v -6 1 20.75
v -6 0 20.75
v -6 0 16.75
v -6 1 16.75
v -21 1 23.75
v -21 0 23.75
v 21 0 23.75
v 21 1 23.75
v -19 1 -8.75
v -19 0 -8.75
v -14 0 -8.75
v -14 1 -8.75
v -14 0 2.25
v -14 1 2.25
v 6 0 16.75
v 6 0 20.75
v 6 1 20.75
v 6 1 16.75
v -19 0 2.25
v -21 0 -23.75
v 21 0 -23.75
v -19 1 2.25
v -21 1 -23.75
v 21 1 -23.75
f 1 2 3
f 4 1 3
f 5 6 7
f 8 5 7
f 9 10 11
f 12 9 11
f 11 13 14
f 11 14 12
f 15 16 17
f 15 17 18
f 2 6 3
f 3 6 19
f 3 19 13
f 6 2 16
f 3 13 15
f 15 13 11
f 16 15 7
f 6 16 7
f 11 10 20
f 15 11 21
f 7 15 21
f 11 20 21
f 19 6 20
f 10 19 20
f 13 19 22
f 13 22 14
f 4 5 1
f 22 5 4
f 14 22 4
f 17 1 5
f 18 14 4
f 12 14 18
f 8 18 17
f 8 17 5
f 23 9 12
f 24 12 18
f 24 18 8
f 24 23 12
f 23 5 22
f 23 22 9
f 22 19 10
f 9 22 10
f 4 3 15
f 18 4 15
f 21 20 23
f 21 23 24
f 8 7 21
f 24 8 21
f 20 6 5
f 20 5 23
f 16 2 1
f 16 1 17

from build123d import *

# Parameters (mm, degrees)
SKETCH1_W           = 42
SKETCH1_H           = 47.5
BOSS_EXTRUDE1_DEPTH = 1
SKETCH2_W           = 5
SKETCH2_H           = 11
SKETCH2_W_2         = 12
SKETCH2_H_2         = 4
CUT_EXTRUDE1_DEPTH  = 5


with BuildPart() as part:
    # Sketch1 → Boss-Extrude1 (new body)
    with BuildSketch(Plane(origin=(0, 0, 0), x_dir=(1, 0, 0), z_dir=(0, 1, 0))):
        Rectangle(SKETCH1_W, SKETCH1_H)
    extrude(amount=BOSS_EXTRUDE1_DEPTH)

    # Sketch2 → Cut-Extrude1 (cut)
    with BuildSketch(Plane(origin=(0, 0, 0), x_dir=(1, 0, 0), z_dir=(0, 1, 0))):
        with Locations((-16.5, 3.25)):
            Rectangle(SKETCH2_W, SKETCH2_H)
        with Locations((0, -18.75)):
            Rectangle(SKETCH2_W_2, SKETCH2_H_2)
    extrude(amount=CUT_EXTRUDE1_DEPTH, mode=Mode.SUBTRACT)


solid = part.part
